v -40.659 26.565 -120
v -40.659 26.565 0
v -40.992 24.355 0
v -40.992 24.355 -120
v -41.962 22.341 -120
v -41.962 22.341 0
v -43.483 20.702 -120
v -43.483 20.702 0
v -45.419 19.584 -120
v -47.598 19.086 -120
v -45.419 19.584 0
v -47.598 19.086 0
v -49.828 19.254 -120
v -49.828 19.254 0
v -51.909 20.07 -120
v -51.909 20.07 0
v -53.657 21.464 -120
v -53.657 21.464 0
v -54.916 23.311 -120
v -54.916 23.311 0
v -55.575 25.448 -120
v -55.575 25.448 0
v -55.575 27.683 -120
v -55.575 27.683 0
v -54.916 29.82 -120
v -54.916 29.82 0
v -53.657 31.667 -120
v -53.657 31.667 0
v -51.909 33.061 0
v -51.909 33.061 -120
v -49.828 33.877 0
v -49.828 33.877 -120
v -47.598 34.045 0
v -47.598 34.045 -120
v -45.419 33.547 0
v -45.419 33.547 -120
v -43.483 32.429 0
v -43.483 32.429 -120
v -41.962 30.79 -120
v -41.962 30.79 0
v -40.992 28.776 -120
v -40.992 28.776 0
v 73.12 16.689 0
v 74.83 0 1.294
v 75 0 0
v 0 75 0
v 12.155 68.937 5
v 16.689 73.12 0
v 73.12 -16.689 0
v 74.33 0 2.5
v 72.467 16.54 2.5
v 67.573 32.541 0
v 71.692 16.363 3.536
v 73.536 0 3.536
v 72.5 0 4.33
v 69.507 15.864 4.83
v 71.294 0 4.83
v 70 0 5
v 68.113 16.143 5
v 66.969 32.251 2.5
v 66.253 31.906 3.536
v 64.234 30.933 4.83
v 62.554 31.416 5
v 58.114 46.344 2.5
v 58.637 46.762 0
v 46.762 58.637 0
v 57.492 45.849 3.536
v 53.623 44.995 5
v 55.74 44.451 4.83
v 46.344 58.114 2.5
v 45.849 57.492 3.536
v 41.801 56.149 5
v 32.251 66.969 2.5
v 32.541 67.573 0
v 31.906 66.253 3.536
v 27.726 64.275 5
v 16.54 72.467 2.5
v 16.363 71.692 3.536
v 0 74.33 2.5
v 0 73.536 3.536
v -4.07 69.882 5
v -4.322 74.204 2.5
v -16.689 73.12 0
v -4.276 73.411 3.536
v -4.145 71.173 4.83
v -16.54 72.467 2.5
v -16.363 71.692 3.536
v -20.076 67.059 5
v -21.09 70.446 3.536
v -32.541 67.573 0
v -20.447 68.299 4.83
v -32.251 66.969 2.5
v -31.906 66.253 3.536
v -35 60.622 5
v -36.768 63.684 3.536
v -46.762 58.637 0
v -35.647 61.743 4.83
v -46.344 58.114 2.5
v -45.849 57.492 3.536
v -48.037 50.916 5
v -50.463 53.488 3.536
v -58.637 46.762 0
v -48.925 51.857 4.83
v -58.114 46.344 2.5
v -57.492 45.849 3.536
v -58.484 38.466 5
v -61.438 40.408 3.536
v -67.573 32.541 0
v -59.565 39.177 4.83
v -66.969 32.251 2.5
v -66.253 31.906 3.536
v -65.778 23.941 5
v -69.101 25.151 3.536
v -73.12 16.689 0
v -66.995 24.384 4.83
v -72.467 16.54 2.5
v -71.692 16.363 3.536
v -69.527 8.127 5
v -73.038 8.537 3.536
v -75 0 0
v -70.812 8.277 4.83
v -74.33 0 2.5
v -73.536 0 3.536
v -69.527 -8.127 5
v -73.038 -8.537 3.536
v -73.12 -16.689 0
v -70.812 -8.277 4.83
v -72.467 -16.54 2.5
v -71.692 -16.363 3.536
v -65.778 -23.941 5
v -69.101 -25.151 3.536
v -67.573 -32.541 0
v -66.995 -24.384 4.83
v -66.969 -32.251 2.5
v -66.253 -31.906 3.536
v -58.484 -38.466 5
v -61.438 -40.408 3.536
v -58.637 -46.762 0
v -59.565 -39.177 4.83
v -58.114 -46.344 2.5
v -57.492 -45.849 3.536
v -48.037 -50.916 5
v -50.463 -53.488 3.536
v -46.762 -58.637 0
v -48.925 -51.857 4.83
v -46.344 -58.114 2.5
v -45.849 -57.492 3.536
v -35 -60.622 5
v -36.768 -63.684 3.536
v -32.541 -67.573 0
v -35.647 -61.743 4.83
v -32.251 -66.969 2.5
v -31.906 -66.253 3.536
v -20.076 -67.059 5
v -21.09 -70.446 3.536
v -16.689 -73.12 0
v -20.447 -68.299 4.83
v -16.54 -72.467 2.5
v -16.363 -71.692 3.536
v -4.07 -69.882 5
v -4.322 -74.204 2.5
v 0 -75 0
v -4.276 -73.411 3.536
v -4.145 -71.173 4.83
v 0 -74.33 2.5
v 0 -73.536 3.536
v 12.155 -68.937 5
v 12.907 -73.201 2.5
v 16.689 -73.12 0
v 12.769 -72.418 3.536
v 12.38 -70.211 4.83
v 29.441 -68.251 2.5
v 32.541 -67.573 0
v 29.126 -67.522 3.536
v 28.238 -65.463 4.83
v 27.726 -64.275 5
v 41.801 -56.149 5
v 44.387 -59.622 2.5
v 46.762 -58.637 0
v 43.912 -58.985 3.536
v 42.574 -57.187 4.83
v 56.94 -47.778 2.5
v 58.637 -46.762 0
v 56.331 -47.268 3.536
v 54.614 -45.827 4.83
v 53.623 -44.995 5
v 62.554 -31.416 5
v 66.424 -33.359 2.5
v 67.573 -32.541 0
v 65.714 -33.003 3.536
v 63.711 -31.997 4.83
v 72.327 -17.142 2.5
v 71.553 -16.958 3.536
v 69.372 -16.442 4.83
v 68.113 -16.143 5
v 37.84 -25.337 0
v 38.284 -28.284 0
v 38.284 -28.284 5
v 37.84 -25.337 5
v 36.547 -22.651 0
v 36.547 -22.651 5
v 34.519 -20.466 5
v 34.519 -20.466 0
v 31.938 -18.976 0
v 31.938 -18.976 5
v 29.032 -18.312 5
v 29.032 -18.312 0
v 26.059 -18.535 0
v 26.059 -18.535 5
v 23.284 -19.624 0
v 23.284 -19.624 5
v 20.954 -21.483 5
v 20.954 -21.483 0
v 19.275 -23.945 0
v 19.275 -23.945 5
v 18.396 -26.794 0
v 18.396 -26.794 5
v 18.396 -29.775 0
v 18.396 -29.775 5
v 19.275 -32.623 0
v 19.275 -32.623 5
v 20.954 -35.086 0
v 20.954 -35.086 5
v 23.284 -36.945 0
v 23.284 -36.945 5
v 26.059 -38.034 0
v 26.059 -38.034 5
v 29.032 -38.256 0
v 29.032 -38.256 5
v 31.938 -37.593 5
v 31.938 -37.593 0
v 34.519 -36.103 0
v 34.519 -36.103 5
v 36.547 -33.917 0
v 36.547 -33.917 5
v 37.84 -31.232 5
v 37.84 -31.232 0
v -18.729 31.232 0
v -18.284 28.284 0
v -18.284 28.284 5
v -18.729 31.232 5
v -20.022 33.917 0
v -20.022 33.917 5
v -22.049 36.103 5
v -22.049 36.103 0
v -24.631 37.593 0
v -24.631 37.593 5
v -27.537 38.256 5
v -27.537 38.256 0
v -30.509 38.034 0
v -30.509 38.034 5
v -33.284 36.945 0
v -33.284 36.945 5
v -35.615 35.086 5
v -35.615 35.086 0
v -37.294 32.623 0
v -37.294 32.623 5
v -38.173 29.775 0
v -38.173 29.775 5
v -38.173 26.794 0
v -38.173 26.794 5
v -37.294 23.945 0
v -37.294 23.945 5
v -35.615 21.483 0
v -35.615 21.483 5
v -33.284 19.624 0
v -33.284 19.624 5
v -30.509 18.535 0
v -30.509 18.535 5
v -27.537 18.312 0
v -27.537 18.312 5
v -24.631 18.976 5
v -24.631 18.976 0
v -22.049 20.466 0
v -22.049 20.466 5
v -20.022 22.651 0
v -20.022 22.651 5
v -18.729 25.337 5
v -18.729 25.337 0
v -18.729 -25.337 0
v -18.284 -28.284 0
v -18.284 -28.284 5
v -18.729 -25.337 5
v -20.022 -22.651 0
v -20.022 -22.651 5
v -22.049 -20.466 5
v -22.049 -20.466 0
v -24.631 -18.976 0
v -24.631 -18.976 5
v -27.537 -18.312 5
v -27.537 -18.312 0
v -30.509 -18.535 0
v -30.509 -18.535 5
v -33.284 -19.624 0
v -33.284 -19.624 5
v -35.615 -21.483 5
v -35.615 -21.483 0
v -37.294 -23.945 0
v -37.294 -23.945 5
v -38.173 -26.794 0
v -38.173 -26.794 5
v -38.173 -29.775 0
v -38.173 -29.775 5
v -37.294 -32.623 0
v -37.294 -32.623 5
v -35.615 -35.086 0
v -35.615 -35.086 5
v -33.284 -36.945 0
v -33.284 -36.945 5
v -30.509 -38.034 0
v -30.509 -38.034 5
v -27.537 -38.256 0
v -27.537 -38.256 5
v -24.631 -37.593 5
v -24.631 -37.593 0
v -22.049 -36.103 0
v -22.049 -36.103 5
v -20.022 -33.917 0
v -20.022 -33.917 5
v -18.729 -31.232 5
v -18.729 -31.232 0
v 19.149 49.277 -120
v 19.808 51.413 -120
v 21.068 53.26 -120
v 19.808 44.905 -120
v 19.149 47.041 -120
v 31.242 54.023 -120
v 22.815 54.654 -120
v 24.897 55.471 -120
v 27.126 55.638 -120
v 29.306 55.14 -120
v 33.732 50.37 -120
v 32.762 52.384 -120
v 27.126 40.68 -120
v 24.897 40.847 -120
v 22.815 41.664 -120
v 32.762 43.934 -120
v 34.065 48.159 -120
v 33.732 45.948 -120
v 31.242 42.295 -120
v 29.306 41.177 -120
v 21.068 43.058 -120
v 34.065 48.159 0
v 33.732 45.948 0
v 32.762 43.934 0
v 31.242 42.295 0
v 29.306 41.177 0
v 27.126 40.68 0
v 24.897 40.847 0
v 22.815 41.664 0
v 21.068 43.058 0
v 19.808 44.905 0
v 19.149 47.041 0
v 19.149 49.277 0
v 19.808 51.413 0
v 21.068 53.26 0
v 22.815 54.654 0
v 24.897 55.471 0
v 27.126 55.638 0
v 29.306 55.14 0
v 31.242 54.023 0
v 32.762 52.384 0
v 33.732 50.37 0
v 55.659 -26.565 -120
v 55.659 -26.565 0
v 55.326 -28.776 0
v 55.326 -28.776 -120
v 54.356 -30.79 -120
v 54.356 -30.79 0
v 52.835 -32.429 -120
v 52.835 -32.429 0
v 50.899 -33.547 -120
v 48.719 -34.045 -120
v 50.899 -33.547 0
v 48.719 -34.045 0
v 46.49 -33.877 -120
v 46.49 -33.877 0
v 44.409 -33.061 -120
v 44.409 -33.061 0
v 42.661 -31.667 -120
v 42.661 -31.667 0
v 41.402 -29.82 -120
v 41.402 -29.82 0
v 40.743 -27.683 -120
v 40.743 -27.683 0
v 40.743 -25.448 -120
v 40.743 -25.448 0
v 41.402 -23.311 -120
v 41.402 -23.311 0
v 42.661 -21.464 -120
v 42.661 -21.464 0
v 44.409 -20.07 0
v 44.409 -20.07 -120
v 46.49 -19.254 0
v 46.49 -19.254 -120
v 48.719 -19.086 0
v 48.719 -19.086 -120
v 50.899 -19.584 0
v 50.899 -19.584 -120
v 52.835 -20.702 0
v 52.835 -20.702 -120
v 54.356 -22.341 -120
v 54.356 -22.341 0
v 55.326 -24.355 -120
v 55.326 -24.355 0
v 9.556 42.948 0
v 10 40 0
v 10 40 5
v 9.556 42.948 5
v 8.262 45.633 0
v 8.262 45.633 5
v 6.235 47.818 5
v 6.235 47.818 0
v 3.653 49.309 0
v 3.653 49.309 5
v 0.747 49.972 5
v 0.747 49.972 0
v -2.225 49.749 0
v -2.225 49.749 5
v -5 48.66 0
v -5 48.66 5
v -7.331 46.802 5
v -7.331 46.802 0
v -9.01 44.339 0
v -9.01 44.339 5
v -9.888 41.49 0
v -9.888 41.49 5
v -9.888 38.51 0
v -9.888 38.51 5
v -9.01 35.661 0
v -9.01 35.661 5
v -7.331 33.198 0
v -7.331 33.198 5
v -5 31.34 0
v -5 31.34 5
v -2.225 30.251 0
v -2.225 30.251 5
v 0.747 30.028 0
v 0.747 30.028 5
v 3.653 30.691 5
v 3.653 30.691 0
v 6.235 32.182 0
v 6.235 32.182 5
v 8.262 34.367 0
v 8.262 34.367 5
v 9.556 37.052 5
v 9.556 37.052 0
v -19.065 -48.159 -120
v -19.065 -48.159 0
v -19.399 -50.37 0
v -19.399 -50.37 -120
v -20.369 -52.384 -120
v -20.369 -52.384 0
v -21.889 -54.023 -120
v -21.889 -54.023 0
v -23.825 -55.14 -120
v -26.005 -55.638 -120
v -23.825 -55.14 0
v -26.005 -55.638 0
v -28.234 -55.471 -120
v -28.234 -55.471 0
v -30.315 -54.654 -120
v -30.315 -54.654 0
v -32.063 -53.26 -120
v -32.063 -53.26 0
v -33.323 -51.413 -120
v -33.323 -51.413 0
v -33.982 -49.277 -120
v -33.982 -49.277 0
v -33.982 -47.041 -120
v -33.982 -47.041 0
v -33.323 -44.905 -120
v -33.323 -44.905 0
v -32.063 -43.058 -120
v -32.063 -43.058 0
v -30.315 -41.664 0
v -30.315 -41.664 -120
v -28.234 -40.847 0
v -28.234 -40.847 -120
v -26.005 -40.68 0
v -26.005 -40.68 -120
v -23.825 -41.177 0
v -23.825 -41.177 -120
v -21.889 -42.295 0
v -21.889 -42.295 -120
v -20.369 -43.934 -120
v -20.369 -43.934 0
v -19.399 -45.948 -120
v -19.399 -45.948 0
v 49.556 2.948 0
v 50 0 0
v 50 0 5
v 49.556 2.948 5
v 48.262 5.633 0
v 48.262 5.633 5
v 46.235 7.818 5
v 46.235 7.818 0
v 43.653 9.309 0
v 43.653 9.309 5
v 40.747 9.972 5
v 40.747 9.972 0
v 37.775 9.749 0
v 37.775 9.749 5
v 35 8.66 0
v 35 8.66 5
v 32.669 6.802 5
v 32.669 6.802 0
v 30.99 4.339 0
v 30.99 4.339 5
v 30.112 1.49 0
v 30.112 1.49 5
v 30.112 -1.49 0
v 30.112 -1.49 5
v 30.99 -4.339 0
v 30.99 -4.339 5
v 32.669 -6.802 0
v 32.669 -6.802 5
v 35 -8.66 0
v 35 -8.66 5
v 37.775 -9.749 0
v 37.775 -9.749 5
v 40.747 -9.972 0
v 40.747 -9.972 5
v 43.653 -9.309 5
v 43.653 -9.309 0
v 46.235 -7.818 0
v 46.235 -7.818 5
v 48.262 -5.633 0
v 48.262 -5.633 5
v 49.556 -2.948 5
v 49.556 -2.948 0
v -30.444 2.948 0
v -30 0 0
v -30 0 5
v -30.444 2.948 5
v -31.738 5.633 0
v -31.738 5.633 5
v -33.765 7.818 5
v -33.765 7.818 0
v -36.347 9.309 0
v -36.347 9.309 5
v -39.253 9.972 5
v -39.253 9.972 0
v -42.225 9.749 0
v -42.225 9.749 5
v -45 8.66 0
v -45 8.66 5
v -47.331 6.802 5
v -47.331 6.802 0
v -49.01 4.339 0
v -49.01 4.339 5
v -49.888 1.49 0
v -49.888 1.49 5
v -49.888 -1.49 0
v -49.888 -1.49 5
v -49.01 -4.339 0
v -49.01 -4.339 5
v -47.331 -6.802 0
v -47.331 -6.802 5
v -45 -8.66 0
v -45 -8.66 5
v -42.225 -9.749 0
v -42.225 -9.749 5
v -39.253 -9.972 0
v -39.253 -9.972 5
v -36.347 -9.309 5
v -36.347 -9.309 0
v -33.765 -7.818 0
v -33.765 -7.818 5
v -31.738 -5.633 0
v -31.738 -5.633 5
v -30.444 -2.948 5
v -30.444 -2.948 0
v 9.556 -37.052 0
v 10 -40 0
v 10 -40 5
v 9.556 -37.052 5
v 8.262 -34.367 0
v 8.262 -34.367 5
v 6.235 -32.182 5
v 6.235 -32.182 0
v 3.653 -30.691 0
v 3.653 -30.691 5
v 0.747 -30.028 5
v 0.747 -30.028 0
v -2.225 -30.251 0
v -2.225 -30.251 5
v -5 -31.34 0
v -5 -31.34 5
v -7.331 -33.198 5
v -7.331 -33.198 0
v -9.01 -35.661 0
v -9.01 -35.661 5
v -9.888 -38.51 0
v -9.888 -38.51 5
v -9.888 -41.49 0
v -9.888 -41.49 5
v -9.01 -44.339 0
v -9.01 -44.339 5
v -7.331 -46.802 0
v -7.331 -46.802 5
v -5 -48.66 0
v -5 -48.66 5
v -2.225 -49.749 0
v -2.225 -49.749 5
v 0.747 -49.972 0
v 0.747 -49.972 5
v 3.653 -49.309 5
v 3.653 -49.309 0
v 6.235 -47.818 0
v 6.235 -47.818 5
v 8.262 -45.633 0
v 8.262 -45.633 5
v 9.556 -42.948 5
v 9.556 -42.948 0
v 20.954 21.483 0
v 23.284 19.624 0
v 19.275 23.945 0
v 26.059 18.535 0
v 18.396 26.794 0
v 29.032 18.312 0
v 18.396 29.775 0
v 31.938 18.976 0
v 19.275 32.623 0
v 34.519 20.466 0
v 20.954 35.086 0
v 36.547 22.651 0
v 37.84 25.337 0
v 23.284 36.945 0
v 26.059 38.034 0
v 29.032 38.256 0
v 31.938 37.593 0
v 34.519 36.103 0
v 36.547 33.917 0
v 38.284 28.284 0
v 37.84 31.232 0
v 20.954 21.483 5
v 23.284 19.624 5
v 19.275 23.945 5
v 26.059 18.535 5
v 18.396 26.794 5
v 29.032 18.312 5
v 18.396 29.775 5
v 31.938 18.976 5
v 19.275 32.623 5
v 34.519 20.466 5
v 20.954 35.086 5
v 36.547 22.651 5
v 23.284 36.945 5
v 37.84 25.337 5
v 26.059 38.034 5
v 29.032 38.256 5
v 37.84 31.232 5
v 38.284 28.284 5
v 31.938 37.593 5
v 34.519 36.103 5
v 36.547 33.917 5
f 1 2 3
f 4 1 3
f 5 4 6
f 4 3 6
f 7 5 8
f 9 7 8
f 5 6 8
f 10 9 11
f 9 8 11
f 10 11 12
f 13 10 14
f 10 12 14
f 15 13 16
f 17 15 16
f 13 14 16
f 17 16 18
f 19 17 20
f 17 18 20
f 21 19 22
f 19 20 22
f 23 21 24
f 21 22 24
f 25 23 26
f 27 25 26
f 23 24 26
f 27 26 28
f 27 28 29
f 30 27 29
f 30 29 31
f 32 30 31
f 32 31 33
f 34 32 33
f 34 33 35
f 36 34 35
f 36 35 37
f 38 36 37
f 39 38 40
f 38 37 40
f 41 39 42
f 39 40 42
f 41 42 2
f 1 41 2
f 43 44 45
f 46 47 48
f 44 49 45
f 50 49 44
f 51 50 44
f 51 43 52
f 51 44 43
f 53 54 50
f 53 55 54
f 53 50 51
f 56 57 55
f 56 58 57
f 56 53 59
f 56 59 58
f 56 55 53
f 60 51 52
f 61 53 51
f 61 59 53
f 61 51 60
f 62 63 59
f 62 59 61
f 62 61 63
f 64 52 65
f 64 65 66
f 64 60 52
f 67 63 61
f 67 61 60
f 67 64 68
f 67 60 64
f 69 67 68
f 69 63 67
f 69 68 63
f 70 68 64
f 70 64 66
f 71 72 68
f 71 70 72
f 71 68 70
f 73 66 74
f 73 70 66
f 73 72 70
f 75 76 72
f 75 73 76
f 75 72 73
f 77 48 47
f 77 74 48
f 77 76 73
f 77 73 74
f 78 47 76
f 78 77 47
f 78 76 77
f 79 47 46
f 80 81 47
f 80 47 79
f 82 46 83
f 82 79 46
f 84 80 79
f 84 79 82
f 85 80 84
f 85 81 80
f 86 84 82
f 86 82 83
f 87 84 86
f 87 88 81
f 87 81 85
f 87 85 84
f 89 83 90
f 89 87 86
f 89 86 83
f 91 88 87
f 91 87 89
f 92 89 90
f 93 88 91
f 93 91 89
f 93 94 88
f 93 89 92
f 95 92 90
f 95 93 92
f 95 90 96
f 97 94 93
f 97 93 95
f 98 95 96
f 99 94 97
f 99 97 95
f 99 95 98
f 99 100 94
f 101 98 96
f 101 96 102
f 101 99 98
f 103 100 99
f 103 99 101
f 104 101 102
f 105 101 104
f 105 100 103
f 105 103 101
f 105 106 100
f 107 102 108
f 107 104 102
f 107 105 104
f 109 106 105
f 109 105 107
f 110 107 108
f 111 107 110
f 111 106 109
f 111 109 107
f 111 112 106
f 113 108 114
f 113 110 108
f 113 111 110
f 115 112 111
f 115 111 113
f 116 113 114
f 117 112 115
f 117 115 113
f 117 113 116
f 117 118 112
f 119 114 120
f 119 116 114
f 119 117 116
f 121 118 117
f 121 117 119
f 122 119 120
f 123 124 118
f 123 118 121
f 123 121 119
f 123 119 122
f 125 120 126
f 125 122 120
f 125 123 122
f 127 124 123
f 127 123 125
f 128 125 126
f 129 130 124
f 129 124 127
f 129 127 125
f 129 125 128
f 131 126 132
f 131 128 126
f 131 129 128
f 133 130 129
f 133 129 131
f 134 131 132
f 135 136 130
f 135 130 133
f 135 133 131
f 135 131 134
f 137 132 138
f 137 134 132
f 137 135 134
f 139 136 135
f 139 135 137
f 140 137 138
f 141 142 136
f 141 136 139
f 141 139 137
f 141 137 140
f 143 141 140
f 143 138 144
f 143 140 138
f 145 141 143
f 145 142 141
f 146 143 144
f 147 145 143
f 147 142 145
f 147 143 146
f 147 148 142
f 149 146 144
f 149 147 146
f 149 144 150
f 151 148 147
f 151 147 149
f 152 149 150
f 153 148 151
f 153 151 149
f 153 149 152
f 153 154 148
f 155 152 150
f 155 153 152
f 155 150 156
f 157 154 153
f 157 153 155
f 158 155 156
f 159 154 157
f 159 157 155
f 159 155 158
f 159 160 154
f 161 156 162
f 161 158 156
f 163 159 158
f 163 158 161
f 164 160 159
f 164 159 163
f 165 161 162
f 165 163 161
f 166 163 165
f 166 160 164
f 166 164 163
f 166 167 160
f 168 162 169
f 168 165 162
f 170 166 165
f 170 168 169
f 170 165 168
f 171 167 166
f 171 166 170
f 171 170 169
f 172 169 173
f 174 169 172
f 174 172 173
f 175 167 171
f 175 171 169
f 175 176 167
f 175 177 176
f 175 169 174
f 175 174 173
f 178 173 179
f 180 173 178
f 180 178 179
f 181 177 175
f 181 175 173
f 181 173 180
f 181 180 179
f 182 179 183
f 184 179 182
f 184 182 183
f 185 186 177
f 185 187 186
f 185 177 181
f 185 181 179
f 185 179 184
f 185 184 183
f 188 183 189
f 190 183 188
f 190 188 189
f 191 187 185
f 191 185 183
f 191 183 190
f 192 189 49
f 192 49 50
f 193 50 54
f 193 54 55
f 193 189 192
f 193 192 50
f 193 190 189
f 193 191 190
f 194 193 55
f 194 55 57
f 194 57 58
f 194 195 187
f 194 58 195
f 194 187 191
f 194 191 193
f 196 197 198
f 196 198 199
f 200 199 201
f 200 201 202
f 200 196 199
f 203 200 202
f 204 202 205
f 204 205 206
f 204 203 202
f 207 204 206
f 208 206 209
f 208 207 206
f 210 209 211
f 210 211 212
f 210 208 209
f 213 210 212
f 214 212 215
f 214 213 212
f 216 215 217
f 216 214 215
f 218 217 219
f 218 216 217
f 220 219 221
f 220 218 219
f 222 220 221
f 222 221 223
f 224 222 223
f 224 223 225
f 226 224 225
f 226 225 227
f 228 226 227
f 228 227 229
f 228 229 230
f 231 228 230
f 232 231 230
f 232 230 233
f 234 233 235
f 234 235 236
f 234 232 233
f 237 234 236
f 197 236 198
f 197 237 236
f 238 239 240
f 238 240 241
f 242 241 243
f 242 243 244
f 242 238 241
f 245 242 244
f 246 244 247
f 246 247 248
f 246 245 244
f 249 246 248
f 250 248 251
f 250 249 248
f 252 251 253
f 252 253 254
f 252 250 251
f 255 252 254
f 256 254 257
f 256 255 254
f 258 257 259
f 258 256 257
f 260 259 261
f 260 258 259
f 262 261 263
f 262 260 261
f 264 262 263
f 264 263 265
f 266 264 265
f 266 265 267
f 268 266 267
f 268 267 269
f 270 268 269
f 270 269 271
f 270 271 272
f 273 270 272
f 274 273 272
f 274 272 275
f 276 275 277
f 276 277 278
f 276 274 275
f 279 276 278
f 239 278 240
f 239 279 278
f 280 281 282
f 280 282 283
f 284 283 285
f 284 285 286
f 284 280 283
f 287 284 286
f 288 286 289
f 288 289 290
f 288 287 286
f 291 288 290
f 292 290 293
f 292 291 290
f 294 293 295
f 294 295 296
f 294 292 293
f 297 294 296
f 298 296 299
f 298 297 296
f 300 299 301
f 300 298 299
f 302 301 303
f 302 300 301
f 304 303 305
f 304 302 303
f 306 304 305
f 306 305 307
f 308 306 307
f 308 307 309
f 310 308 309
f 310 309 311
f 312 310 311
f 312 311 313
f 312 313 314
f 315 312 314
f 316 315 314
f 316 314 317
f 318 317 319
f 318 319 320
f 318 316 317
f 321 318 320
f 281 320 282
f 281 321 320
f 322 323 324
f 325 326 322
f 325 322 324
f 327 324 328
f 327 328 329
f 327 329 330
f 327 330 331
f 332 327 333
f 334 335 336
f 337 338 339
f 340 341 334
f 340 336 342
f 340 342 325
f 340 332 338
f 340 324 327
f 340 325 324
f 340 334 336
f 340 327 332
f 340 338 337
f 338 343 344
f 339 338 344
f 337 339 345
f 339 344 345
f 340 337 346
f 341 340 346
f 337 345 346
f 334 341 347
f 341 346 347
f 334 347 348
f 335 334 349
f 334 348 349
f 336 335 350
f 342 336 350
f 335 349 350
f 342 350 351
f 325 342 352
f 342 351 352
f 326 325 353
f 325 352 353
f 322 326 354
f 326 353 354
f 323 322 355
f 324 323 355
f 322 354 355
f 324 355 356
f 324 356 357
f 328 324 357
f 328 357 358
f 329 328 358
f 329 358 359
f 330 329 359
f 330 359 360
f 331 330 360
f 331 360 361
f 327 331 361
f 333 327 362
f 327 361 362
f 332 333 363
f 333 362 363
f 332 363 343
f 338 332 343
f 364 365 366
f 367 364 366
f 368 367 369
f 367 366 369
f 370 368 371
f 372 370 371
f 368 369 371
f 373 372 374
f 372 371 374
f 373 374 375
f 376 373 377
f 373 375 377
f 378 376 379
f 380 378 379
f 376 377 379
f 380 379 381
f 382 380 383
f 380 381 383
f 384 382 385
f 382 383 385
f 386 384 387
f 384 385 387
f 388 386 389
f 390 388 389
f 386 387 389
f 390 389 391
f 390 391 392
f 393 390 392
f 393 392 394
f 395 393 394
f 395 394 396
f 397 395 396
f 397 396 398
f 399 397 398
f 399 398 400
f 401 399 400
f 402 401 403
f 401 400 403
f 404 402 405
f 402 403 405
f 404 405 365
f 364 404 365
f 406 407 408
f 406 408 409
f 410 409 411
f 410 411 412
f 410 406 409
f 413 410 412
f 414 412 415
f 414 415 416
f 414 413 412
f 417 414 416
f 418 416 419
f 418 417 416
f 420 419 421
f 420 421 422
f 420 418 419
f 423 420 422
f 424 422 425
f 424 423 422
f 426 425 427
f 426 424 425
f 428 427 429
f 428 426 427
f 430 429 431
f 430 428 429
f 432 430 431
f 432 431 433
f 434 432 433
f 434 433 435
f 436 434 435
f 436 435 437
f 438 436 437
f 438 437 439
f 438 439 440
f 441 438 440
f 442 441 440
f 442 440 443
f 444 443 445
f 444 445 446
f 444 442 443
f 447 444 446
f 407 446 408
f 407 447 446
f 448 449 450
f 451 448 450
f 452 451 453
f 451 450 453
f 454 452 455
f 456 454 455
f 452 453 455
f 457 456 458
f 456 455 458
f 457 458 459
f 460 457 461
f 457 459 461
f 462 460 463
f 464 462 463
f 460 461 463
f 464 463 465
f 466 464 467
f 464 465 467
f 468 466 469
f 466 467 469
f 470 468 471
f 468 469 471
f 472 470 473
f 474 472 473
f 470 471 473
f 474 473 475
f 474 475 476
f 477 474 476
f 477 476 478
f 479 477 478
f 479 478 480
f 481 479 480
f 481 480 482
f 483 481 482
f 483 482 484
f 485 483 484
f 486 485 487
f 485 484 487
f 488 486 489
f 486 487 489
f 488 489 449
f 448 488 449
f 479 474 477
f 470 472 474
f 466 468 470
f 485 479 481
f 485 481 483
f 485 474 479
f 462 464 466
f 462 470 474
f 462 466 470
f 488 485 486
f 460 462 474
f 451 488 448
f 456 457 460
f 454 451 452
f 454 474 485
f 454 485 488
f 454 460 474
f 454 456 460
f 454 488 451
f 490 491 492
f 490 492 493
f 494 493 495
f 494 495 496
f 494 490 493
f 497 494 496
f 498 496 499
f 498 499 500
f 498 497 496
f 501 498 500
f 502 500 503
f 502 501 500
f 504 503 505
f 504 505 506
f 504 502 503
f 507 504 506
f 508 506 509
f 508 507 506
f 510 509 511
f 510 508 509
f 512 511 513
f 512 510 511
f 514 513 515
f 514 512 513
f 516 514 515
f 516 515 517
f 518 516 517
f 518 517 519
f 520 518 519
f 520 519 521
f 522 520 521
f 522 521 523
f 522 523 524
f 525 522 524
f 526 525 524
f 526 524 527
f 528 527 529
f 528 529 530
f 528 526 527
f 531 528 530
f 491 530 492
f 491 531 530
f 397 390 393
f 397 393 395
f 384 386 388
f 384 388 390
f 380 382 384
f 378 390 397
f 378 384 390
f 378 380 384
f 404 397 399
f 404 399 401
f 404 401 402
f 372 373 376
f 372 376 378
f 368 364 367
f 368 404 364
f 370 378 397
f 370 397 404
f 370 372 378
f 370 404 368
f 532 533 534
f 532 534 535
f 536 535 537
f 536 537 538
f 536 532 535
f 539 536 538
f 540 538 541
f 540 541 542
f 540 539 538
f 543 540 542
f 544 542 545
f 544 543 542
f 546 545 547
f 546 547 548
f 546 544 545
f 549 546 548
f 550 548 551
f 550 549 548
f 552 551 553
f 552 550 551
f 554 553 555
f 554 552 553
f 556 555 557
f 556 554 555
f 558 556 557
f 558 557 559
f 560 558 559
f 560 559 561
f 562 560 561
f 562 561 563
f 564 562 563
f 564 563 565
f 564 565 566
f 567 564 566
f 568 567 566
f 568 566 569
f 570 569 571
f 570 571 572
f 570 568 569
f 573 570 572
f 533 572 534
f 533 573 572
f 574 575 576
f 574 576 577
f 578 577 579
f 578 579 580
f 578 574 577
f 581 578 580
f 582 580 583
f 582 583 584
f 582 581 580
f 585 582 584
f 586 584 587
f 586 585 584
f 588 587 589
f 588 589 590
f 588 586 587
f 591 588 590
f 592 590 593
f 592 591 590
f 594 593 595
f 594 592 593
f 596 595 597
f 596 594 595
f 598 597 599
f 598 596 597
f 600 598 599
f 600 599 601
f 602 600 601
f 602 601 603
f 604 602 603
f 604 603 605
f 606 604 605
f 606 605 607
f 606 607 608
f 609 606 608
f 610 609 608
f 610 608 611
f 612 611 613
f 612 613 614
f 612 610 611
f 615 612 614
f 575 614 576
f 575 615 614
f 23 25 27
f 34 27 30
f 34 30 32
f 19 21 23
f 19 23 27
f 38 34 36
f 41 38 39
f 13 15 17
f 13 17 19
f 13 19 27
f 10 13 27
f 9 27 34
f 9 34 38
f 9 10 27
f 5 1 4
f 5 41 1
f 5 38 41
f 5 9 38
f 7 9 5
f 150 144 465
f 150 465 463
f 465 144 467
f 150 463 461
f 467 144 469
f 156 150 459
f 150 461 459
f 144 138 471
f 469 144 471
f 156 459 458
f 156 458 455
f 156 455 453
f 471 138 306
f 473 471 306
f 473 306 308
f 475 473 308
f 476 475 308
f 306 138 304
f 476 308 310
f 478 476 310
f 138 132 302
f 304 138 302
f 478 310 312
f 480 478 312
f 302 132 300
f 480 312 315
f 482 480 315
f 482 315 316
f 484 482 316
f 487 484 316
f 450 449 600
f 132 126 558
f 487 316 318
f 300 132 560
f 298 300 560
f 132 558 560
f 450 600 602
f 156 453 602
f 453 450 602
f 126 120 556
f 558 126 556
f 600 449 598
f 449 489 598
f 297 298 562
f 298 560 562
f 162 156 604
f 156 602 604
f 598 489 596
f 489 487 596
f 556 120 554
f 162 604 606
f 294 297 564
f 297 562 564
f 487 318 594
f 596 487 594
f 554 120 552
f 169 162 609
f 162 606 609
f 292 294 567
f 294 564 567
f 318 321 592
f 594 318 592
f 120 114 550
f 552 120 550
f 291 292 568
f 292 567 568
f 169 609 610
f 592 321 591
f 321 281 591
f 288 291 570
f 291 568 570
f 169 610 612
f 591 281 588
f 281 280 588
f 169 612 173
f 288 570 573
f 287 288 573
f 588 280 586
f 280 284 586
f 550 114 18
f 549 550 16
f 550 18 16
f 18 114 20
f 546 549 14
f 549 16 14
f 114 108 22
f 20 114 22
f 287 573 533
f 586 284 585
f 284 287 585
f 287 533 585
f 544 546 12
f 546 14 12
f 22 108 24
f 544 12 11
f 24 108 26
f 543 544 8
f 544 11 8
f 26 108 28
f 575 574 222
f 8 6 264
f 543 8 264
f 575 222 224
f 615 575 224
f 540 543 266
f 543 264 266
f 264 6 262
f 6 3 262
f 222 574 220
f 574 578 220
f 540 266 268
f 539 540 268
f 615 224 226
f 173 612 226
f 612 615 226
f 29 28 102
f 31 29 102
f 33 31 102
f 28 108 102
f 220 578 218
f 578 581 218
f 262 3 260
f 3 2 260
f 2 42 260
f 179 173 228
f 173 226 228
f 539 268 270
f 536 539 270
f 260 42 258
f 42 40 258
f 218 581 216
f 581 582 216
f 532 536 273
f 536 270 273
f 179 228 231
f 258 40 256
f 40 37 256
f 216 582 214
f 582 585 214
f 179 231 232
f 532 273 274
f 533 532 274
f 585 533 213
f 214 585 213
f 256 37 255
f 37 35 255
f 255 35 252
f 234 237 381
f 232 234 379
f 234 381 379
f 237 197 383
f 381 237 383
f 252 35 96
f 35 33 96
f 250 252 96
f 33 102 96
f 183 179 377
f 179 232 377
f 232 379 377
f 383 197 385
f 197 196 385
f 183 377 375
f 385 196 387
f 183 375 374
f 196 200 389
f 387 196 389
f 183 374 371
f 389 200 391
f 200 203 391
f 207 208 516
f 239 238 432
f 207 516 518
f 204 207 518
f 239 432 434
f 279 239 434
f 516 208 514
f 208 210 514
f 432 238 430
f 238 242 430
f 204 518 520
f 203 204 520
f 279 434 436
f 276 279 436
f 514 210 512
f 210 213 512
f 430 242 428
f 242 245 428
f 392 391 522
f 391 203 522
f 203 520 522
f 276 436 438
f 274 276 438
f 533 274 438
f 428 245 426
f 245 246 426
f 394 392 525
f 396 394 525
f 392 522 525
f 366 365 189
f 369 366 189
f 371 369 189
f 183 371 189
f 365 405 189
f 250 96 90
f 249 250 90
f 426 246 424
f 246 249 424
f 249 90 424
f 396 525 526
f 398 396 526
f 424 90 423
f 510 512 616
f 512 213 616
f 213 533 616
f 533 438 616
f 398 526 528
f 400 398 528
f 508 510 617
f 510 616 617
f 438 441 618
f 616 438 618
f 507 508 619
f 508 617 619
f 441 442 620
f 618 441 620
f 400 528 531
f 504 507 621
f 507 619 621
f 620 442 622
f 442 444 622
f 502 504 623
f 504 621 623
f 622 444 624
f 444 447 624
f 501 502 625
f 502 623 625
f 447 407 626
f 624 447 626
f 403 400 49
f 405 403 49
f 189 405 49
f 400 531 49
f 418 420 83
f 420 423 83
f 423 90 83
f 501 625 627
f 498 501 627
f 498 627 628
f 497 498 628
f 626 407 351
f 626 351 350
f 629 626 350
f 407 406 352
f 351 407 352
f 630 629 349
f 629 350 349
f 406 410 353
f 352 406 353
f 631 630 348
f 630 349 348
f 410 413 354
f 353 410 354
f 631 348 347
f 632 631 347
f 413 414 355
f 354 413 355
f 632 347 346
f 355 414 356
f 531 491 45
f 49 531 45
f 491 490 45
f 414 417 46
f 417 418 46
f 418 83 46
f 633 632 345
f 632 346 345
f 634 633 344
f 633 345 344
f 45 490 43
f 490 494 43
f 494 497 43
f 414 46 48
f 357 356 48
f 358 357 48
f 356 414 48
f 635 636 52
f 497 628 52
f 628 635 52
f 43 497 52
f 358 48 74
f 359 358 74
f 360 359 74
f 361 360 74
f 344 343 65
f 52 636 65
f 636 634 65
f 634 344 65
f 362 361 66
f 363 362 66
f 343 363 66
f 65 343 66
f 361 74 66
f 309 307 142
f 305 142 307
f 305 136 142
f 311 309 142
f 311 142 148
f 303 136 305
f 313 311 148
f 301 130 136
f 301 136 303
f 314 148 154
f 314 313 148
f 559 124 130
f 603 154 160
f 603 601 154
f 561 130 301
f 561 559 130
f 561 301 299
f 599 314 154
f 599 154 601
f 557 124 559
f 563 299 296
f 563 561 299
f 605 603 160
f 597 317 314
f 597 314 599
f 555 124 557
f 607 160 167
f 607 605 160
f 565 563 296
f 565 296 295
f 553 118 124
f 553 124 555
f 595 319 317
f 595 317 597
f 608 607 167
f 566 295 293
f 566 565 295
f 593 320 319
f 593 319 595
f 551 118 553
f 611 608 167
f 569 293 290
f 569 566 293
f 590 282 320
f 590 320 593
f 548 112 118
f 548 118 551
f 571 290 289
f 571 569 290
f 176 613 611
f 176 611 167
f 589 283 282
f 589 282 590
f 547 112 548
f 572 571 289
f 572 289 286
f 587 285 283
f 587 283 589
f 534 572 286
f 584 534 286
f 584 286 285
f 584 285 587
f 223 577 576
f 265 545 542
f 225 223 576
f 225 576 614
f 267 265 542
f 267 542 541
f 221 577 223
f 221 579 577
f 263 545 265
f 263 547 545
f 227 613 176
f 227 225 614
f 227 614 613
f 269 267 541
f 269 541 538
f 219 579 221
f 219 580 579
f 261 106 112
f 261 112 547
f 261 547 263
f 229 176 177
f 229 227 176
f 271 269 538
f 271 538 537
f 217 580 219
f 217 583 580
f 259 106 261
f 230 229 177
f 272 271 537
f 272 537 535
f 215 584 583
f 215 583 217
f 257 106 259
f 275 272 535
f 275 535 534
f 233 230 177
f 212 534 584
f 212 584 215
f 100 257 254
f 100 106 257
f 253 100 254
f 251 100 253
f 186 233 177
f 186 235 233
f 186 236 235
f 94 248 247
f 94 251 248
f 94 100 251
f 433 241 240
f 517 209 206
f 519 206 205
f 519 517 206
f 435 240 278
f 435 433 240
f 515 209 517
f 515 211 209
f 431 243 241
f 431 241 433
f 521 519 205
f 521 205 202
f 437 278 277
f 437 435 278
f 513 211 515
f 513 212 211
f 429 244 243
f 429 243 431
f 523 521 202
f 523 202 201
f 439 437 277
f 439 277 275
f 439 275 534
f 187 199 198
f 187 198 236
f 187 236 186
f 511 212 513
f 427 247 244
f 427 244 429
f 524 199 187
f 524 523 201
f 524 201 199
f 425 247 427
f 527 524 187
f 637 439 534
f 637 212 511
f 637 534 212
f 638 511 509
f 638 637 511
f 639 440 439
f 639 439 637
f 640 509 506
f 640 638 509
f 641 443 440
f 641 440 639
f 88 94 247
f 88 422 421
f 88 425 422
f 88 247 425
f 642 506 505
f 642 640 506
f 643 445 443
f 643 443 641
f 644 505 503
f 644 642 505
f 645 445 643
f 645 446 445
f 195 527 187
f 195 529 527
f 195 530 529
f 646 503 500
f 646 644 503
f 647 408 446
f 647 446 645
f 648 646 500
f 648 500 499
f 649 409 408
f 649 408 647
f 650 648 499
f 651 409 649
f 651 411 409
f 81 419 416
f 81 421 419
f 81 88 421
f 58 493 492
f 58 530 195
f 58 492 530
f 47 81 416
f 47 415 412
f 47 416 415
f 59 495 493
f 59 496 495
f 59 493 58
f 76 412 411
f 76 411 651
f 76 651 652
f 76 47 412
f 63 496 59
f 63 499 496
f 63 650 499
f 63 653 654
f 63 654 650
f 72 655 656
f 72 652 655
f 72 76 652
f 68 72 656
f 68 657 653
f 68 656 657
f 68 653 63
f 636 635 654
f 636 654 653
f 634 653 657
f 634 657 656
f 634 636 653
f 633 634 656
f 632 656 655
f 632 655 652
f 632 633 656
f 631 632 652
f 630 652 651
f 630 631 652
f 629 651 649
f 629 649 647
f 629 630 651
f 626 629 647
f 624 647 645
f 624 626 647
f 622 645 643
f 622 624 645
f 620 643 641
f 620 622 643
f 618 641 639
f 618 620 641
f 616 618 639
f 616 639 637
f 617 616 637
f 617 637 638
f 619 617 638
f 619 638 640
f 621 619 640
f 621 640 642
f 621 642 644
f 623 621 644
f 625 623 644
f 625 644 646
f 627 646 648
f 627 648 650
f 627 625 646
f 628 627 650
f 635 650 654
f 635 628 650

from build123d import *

# Parameters (mm, degrees)
F0_R     = 75
F0_R_2   = 10
F1_DEPTH = 5
F2_R     = 4.99999
F3_R     = 7.5
F4_DEPTH = 120


# Not quite as in the source:
# - a fillet or chamfer is up to 0.001 mm smaller than in the source, because OpenCascade refuses the exact size


with BuildPart() as f1:
    # F0 (on Top) → F1 (new body)
    with BuildSketch(Plane.XY):
        Circle(F0_R)
        with Locations((-28.2842712475, -28.2842712475)):
            Circle(F0_R_2, mode=Mode.SUBTRACT)
        with Locations((0, -40)):
            Circle(F0_R_2, mode=Mode.SUBTRACT)
        with Locations((28.2842712475, -28.2842712475)):
            Circle(F0_R_2, mode=Mode.SUBTRACT)
        with Locations((-40, 0)):
            Circle(F0_R_2, mode=Mode.SUBTRACT)
        with Locations((-28.2842712475, 28.2842712475)):
            Circle(F0_R_2, mode=Mode.SUBTRACT)
        with Locations((28.2842712475, 28.2842712475)):
            Circle(F0_R_2, mode=Mode.SUBTRACT)
        with Locations((40, 0)):
            Circle(F0_R_2, mode=Mode.SUBTRACT)
        with Locations((0, 40)):
            Circle(F0_R_2, mode=Mode.SUBTRACT)
    extrude(amount=F1_DEPTH)

    # F2 (radius 5 in the source; OpenCascade refuses exactly that, so slightly less here)
    f2_edges = [f1.edges().sort_by_distance(p)[0] for p in [
        (-75, 0, 5),
    ]]
    fillet(f2_edges, radius=F2_R)

    # F3 (on face) → F4 (join)
    with BuildSketch(Plane(origin=(0, 0, 0), x_dir=(1, 0, 0), z_dir=(0, 0, -1))):
        with Locations((-26.565498142, 48.1588445508)):
            Circle(F3_R)
        with Locations((-48.1588445508, -26.565498142)):
            Circle(F3_R)
        with Locations((26.565498142, -48.1588445508)):
            Circle(F3_R)
        with Locations((48.1588445508, 26.565498142)):
            Circle(F3_R)
    extrude(amount=F4_DEPTH)


solid = f1.part
